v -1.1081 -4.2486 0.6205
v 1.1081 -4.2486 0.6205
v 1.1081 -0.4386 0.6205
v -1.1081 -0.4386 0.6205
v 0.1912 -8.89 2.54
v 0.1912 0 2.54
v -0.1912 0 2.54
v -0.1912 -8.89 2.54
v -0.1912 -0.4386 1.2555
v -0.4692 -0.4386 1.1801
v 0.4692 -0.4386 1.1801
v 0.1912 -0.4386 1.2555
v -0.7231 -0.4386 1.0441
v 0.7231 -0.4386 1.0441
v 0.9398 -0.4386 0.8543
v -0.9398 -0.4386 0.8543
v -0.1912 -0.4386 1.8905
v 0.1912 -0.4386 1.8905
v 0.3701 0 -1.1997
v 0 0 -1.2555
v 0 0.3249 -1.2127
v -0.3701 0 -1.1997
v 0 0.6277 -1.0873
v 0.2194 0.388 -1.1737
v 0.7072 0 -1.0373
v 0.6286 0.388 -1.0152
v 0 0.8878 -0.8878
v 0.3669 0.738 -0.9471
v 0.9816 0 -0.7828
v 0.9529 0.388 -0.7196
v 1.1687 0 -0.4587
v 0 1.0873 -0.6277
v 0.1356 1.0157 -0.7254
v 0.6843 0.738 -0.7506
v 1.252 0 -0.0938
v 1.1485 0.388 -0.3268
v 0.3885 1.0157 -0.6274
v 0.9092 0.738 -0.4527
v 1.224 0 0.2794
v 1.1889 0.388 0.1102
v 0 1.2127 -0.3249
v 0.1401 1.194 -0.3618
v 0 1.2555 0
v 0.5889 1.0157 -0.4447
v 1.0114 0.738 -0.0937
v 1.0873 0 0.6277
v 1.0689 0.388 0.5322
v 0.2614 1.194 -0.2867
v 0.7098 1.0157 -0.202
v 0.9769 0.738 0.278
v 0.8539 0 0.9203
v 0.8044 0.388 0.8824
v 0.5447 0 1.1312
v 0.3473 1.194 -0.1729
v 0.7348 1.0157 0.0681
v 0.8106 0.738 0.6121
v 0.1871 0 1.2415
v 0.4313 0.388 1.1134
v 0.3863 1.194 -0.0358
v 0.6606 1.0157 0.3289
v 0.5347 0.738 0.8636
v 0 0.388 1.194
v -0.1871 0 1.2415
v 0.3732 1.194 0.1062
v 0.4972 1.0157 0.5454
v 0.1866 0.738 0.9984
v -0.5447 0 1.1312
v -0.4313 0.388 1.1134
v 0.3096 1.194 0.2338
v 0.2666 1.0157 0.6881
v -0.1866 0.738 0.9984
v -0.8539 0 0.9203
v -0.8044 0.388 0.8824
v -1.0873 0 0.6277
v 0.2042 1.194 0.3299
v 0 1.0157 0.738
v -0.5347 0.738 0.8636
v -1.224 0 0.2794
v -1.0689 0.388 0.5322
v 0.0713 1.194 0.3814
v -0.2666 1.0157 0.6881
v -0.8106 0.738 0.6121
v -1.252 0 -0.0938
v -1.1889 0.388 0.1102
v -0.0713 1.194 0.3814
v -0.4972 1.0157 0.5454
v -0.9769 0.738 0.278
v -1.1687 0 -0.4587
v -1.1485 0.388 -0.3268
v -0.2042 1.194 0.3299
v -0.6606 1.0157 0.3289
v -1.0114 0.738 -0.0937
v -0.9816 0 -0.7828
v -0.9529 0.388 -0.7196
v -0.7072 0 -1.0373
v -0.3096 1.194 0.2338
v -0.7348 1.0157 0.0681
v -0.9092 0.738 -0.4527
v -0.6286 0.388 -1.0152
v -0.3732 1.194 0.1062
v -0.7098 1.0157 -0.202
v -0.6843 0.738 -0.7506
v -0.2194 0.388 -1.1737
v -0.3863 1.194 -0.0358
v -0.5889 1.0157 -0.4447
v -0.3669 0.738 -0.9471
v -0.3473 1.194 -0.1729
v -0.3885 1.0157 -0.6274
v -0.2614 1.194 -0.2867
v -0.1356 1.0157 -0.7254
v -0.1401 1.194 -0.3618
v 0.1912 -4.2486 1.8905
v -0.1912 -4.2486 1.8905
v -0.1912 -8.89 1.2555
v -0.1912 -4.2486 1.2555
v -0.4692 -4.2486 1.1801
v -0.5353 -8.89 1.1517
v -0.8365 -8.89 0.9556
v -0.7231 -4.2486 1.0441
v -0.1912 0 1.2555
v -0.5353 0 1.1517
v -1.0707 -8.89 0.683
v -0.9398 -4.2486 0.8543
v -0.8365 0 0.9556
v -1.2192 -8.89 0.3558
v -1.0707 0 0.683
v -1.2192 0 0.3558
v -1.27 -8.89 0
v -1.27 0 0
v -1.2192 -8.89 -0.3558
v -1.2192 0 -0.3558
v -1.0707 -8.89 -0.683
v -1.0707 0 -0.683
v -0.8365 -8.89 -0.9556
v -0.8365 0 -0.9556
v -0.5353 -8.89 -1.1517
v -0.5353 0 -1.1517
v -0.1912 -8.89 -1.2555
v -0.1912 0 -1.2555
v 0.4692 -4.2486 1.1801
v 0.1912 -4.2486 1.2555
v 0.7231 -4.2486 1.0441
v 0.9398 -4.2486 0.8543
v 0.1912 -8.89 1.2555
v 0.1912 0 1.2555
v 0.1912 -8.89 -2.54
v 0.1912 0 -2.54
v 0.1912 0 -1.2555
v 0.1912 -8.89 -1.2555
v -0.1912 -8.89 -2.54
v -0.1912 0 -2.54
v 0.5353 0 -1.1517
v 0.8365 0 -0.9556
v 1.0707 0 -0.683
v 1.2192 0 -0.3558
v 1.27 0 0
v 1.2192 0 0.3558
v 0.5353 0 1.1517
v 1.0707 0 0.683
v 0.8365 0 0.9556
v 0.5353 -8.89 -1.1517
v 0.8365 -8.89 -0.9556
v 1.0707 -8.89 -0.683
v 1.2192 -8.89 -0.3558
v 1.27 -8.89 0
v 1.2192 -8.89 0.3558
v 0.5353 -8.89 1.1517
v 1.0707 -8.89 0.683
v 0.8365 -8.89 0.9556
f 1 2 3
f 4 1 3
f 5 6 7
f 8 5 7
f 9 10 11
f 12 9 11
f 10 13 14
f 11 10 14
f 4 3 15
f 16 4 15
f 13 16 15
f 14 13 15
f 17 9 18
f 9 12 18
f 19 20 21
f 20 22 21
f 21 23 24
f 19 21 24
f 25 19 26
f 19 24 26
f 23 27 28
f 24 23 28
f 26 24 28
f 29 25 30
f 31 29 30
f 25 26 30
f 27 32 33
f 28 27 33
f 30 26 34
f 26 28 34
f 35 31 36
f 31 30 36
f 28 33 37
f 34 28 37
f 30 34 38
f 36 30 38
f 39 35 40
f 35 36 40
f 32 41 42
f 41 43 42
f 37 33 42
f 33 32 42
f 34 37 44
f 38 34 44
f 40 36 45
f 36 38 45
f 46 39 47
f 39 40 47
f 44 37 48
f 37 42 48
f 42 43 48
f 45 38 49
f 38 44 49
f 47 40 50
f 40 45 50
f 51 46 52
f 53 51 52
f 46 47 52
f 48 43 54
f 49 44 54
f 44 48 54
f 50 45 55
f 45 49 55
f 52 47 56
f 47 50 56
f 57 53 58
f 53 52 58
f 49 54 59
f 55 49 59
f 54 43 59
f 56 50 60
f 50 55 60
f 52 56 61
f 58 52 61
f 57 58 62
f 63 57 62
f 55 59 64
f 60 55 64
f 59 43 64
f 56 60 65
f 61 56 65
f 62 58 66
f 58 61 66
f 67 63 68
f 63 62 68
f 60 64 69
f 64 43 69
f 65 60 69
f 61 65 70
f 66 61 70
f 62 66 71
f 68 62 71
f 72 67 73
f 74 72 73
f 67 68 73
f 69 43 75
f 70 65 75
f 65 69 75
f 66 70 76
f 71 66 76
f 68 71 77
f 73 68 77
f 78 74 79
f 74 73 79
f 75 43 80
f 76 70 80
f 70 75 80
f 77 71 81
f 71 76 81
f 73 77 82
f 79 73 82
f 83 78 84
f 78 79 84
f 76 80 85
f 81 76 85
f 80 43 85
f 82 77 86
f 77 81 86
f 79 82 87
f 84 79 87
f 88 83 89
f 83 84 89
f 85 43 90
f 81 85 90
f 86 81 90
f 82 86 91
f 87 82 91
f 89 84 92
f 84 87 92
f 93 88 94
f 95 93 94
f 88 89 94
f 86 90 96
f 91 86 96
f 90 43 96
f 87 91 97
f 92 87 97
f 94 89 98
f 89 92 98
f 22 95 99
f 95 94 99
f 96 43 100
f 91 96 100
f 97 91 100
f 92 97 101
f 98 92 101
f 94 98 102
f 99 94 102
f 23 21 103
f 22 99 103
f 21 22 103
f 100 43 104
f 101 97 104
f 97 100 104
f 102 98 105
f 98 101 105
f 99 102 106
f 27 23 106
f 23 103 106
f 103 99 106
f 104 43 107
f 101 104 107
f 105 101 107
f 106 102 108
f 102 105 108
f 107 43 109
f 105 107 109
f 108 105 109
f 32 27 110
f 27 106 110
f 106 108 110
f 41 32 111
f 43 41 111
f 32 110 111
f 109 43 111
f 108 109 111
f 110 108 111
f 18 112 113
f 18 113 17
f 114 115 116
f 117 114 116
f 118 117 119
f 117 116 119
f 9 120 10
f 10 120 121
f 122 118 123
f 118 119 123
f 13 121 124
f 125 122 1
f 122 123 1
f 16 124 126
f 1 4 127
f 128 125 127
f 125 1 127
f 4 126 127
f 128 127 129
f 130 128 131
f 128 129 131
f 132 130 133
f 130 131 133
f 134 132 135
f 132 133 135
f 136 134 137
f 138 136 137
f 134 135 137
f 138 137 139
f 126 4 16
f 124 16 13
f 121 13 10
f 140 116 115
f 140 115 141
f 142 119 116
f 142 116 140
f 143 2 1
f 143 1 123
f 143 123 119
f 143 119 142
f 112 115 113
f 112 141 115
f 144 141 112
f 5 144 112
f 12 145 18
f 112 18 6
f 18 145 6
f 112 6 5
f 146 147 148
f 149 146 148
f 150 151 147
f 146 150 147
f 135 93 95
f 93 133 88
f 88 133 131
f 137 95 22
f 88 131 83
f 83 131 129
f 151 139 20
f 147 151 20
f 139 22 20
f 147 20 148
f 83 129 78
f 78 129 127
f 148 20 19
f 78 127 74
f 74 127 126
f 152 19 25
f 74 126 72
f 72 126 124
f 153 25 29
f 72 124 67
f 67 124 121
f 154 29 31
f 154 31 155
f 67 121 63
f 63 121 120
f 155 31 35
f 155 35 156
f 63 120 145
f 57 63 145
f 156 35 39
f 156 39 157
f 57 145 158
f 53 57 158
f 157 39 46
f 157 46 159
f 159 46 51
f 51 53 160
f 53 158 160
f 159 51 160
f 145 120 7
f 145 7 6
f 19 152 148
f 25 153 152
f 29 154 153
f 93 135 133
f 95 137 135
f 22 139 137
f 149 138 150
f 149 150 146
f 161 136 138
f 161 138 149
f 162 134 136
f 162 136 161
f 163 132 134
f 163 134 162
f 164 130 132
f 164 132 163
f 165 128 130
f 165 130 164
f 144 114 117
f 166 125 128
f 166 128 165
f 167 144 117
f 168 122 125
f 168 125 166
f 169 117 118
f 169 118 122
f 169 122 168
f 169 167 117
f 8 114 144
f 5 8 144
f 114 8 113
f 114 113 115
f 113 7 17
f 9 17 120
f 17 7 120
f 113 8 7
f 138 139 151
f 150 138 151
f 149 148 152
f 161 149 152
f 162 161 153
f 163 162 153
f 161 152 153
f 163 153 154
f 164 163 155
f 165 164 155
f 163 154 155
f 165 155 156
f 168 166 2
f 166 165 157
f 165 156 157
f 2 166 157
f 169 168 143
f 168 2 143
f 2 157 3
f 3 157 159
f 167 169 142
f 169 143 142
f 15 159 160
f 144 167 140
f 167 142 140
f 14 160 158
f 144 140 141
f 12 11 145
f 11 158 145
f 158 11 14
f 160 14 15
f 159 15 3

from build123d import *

# Parameters (mm, degrees)
F1_DEPTH = 8.89
F4_W     = 3.81
F4_H     = 1.27
F5_DEPTH = 12.7


with BuildPart() as f1:
    # F0 (on Front) → F1 (new body)
    with BuildSketch(Plane.XZ):
        with BuildLine():
            Line((0.1912181615, -2.54), (0.1912181615, -1.2555220487))
            ThreePointArc((0.1912181615, -1.2555220487), (1.27, 0), (0.1912181615, 1.2555220487))
            Line((0.1912181615, 1.2555220487), (0.1912181615, 2.54))
            Line((0.1912181615, 2.54), (-0.1912181615, 2.54))
            Line((-0.1912181615, 2.54), (-0.1912181615, 1.2555220487))
            ThreePointArc((-0.1912181615, 1.2555220487), (-1.27, 0), (-0.1912181615, -1.2555220487))
            Line((-0.1912181615, -1.2555220487), (-0.1912181615, -2.54))
            Line((-0.1912181615, -2.54), (0.1912181615, -2.54))
        make_face()
    extrude(amount=F1_DEPTH)

    # F2 (on Right) → F3 (revolve)
    with BuildSketch(Plane.YZ):
        with BuildLine():
            Line((0, 0), (0, -1.2554830802))
            ThreePointArc((0, -1.2554830802), (0.8877605997, -0.8877605997), (1.2554830802, 0))
            Line((1.2554830802, 0), (0, 0))
        make_face()
    revolve(axis=Axis((0, 0.6277415401, 0), (0, -1, 0)))

    # F4 (on face) → F5 (cut, symmetric)
    with BuildSketch(Plane.YZ.offset(0.1912181615)):
        with Locations((-2.3436378688, 1.2555220487)):
            Rectangle(F4_W, F4_H)
    extrude(amount=F5_DEPTH, both=True, mode=Mode.SUBTRACT)


solid = f1.part
